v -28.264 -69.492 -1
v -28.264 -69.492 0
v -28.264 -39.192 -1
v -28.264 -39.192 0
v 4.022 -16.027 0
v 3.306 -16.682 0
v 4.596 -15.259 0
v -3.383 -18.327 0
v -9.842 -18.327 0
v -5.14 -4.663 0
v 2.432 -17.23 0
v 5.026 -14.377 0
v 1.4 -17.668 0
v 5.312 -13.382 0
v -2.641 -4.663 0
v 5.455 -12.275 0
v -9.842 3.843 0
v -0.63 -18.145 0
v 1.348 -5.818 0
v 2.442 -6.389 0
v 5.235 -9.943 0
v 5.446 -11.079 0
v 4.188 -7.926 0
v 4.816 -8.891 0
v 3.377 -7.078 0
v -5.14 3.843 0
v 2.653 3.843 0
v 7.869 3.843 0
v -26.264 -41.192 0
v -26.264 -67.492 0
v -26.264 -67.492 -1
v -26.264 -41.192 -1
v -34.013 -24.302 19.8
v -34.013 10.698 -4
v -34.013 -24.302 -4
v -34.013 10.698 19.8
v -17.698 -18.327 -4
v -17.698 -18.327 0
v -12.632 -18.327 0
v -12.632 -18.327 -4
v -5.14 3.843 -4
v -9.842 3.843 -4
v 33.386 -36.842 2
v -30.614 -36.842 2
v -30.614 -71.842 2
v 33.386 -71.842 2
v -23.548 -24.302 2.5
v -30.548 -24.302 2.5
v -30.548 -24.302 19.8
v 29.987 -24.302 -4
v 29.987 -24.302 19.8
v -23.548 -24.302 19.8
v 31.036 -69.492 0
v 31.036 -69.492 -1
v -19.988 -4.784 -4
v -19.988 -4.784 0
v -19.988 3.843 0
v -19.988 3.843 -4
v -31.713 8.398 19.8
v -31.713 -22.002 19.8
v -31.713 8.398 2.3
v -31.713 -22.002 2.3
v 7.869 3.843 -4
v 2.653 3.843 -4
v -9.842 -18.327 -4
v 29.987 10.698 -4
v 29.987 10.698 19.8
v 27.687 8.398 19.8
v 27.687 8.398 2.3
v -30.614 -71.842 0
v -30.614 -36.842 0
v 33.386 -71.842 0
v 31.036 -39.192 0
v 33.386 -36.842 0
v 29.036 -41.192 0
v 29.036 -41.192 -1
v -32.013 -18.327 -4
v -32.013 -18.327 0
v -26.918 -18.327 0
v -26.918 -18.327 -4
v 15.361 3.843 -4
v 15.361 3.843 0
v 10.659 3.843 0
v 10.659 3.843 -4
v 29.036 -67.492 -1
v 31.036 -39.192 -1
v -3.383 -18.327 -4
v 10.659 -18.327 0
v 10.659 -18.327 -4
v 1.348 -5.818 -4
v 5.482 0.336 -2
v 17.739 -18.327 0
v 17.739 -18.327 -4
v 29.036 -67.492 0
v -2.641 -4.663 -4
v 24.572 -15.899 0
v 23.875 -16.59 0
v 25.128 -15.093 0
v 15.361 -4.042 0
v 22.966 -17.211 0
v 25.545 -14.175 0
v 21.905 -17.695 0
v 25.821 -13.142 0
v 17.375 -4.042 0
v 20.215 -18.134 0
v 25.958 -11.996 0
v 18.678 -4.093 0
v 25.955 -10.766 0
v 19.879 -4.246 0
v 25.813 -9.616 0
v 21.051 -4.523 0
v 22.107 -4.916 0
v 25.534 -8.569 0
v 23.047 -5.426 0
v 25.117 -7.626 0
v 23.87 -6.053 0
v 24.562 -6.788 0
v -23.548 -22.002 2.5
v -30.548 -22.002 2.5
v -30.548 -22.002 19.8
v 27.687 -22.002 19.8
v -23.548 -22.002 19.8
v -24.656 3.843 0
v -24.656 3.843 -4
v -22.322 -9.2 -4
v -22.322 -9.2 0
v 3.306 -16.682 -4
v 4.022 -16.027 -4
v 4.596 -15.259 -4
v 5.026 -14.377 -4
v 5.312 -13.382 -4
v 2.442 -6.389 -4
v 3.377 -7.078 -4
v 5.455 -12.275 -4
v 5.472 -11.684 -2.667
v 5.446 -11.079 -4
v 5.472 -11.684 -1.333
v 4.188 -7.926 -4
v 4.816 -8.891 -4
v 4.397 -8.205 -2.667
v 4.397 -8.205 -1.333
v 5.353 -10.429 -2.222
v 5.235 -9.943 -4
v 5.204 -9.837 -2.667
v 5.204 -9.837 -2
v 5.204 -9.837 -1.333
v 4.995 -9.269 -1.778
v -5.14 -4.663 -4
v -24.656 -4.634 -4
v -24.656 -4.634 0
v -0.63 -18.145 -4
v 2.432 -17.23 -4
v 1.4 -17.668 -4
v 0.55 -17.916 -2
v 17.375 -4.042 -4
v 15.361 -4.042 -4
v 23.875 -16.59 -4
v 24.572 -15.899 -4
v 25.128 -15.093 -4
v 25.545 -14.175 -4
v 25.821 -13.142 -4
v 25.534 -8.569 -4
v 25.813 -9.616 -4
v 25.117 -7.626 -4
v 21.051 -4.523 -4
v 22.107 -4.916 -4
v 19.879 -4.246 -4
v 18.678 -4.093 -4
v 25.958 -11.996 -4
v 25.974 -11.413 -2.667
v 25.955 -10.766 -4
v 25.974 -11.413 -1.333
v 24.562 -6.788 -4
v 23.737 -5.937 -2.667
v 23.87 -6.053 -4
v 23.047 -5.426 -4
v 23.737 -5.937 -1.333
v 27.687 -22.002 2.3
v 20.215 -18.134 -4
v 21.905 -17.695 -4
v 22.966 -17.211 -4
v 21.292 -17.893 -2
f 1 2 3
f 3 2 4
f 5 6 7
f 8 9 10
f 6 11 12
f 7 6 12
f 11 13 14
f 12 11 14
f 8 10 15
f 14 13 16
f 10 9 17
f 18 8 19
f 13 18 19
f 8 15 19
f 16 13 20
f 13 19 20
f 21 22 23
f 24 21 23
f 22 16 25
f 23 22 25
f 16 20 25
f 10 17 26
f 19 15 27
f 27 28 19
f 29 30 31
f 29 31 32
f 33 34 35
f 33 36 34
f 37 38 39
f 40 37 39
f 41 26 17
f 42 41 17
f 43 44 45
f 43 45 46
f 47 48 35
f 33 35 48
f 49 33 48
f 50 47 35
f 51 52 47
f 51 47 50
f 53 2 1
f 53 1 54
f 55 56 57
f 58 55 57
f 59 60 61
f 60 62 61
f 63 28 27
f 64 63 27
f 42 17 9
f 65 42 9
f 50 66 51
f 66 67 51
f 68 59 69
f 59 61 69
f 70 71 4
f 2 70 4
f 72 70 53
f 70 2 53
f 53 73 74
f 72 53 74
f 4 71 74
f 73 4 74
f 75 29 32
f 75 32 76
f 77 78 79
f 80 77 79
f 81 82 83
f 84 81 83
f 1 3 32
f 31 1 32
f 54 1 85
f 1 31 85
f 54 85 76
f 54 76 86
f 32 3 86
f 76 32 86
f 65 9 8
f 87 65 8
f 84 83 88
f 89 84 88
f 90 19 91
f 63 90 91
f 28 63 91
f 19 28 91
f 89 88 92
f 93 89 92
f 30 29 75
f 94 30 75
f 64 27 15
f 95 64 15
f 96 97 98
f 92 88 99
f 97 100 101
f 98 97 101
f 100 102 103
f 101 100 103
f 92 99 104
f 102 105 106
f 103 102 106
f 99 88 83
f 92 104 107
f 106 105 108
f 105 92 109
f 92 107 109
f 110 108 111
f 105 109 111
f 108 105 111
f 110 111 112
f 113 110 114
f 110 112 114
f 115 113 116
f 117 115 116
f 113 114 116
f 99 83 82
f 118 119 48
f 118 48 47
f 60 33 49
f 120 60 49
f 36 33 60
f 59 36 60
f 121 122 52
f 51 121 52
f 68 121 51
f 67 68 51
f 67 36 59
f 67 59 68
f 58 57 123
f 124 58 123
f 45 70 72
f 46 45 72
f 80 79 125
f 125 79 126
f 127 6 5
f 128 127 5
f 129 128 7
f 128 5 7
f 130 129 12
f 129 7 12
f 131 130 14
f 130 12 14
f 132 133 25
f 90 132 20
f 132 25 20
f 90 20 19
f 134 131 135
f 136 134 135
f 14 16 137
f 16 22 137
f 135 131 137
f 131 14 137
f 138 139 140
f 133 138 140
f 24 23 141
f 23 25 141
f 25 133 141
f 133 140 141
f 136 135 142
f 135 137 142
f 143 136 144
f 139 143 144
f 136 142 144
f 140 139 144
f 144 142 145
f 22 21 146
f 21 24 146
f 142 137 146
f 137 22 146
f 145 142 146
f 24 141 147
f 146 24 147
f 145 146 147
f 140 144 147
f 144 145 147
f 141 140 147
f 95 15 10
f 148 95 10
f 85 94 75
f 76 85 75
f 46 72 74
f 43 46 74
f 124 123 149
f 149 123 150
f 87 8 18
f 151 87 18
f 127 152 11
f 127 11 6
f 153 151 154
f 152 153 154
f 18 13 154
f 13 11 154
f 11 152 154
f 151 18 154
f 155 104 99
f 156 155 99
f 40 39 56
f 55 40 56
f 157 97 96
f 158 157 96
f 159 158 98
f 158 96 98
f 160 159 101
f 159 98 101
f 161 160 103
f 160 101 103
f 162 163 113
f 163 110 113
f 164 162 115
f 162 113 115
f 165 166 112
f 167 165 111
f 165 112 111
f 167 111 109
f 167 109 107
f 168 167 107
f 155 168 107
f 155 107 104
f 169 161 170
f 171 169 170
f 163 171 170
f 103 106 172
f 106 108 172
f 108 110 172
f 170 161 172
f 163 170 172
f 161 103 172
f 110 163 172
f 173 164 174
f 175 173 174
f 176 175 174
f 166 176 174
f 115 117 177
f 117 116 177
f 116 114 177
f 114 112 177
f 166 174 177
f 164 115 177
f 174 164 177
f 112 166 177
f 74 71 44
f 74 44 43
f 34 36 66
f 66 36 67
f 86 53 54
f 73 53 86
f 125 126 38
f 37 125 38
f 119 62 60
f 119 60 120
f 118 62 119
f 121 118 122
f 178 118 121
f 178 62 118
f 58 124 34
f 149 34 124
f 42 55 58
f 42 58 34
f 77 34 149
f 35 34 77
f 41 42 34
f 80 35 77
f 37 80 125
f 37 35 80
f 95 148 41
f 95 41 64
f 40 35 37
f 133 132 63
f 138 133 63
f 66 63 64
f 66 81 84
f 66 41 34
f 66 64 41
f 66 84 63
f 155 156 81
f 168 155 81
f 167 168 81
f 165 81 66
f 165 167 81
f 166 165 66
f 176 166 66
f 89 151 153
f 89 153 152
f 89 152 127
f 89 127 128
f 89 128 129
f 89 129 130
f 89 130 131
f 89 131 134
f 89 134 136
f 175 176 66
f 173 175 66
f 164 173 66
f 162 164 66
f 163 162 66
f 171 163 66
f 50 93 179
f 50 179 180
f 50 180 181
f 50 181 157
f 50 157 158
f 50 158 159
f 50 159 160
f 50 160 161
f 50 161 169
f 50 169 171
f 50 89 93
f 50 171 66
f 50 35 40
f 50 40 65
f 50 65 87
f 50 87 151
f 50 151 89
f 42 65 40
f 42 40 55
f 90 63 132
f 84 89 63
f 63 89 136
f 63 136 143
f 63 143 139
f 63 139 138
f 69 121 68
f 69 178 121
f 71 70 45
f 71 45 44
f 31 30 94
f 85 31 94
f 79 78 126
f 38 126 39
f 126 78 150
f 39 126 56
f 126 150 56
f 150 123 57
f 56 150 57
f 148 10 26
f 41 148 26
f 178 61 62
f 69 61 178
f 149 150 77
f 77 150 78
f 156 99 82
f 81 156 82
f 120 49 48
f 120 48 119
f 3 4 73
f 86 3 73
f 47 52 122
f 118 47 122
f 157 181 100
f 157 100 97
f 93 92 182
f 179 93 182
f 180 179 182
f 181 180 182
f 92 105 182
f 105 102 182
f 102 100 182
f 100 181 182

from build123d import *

# Parameters (mm, degrees)
F0_W      = 64
F0_H      = 35
F1_DEPTH  = 19.8
F2_T      = -2.3
F4_W      = 7
F4_H      = 2.3
F5_DEPTH  = 17.3
F3_W      = 64
F3_H      = 35
F6_DEPTH  = 4
F7_W      = 64
F7_H      = 35
F9_DEPTH  = 2
F8_W      = 59.3
F8_H      = 30.3
F8_W_2    = 55.3
F8_H_2    = 26.3
F10_DEPTH = 1


with BuildPart() as f1:
    # F0 (on Top) → F1 (new body)
    with BuildSketch(Plane.XY):
        with Locations((-2.0125784278, -6.8018344045)):
            Rectangle(F0_W, F0_H)
    extrude(amount=F1_DEPTH)

    # F2
    f2_openings = [f1.faces().sort_by_distance(p)[0] for p in [
        (-2.012578, -6.801834, 19.8),
    ]]
    offset(amount=F2_T, openings=f2_openings)

    # F4 (on face) → F5 (cut)
    with BuildSketch(Plane.XY.offset(19.8)):
        with Locations((-27.0480081588, -23.1518344045)):
            Rectangle(F4_W, F4_H)
    extrude(amount=-F5_DEPTH, mode=Mode.SUBTRACT)

    # F3 (on face) → F6 (join)
    with BuildSketch(Plane(origin=(0, 0, 0), x_dir=(1, 0, 0), z_dir=(0, 0, -1))):
        with Locations((-2.0125784278, 6.8018344045)):
            Rectangle(F3_W, F3_H)
        Polygon((-26.9175521439, 18.3273626809), (-22.3223236765, 9.1999870238), (-17.6979807731, 18.3273626809), (-12.6320689252, 18.3273626809), (-19.9883163979, 4.7842975778), (-19.9883163979, -3.8432802629), (-24.6563309551, -3.8432802629), (-24.6563309551, 4.6338729923), (-32.0125784278, 18.3273626809), align=None, mode=Mode.SUBTRACT)
        with BuildLine():
            Line((-2.6409650028, 4.6629874282), (-5.1399540849, 4.6629874282))
            Line((-5.1399540849, 4.6629874282), (-5.1399540849, -3.8432802629))
            Line((-5.1399540849, -3.8432802629), (-9.841935484, -3.8432802629))
            Line((-9.841935484, -3.8432802629), (-9.841935484, 18.3273626809))
            Line((-9.841935484, 18.3273626809), (-3.3833831185, 18.3273626809))
            add(Edge.make_bspline(
                [(-3.3833831185, 18.3273626809), (1.1390592592, 18.3273626809), (3.3056585314, 16.6823970521)],
                knots=[0, 0, 0, 1, 1, 1], degree=2))
            add(Edge.make_bspline(
                [(3.3056585314, 16.6823970521), (5.4722578035, 15.0374314234), (5.4722578035, 11.684418888)],
                knots=[0, 0, 0, 1, 1, 1], degree=2))
            add(Edge.make_bspline(
                [(5.4722578035, 11.684418888), (5.4722578035, 9.7288992762), (4.3974498779, 8.205243797)],
                knots=[0, 0, 0, 1, 1, 1], degree=2))
            add(Edge.make_bspline(
                [(4.3974498779, 8.205243797), (3.3226419523, 6.6815883178), (1.3477127166, 5.8178600526)],
                knots=[0, 0, 0, 1, 1, 1], degree=2))
            add(Edge.make_bspline(
                [(1.3477127166, 5.8178600526), (6.3553956927, -1.6596975698), (7.8693463599, -3.8432802629)],
                knots=[0, 0, 0, 1, 1, 1], degree=2))
            Line((7.8693463599, -3.8432802629), (2.6530099264, -3.8432802629))
            Line((2.6530099264, -3.8432802629), (-2.6409650028, 4.6629874282))
        make_face(mode=Mode.SUBTRACT)
        with BuildLine():
            add(Edge.make_bspline(
                [(23.8750075002, 16.5902013384), (25.9736730886, 14.8530399959), (25.9736730886, 11.4126841528)],
                knots=[0, 0, 0, 1, 1, 1], degree=2))
            add(Edge.make_bspline(
                [(25.9736730886, 11.4126841528), (25.9736730886, 7.8316085362), (23.7367139297, 5.9367439992)],
                knots=[0, 0, 0, 1, 1, 1], degree=2))
            add(Edge.make_bspline(
                [(23.7367139297, 5.9367439992), (21.4997547708, 4.0418794622), (17.3752096838, 4.0418794622)],
                knots=[0, 0, 0, 1, 1, 1], degree=2))
            Line((17.3752096838, 4.0418794622), (15.3614612002, 4.0418794622))
            Line((15.3614612002, 4.0418794622), (15.3614612002, -3.8432802629))
            Line((15.3614612002, -3.8432802629), (10.6594798011, -3.8432802629))
            Line((10.6594798011, -3.8432802629), (10.6594798011, 18.3273626809))
            Line((10.6594798011, 18.3273626809), (17.7391401327, 18.3273626809))
            add(Edge.make_bspline(
                [(17.7391401327, 18.3273626809), (21.7763419119, 18.3273626809), (23.8750075002, 16.5902013384)],
                knots=[0, 0, 0, 1, 1, 1], degree=2))
        make_face(mode=Mode.SUBTRACT)
    extrude(amount=F6_DEPTH)


with BuildPart() as f9:
    # F7 (on Top) → F9 (new body)
    with BuildSketch(Plane.XY):
        with Locations((1.3861044943, -54.3424897641)):
            Rectangle(F7_W, F7_H)
    extrude(amount=F9_DEPTH)

    # F8 (on face) → F10 (join)
    with BuildSketch(Plane.XY):
        with Locations((1.3861044943, -54.3424897641)):
            Rectangle(F8_W, F8_H)
        with Locations((1.3861044943, -54.3424897641)):
            Rectangle(F8_W_2, F8_H_2, mode=Mode.SUBTRACT)
    extrude(amount=-F10_DEPTH)


solid = Compound([f1.part, f9.part])
